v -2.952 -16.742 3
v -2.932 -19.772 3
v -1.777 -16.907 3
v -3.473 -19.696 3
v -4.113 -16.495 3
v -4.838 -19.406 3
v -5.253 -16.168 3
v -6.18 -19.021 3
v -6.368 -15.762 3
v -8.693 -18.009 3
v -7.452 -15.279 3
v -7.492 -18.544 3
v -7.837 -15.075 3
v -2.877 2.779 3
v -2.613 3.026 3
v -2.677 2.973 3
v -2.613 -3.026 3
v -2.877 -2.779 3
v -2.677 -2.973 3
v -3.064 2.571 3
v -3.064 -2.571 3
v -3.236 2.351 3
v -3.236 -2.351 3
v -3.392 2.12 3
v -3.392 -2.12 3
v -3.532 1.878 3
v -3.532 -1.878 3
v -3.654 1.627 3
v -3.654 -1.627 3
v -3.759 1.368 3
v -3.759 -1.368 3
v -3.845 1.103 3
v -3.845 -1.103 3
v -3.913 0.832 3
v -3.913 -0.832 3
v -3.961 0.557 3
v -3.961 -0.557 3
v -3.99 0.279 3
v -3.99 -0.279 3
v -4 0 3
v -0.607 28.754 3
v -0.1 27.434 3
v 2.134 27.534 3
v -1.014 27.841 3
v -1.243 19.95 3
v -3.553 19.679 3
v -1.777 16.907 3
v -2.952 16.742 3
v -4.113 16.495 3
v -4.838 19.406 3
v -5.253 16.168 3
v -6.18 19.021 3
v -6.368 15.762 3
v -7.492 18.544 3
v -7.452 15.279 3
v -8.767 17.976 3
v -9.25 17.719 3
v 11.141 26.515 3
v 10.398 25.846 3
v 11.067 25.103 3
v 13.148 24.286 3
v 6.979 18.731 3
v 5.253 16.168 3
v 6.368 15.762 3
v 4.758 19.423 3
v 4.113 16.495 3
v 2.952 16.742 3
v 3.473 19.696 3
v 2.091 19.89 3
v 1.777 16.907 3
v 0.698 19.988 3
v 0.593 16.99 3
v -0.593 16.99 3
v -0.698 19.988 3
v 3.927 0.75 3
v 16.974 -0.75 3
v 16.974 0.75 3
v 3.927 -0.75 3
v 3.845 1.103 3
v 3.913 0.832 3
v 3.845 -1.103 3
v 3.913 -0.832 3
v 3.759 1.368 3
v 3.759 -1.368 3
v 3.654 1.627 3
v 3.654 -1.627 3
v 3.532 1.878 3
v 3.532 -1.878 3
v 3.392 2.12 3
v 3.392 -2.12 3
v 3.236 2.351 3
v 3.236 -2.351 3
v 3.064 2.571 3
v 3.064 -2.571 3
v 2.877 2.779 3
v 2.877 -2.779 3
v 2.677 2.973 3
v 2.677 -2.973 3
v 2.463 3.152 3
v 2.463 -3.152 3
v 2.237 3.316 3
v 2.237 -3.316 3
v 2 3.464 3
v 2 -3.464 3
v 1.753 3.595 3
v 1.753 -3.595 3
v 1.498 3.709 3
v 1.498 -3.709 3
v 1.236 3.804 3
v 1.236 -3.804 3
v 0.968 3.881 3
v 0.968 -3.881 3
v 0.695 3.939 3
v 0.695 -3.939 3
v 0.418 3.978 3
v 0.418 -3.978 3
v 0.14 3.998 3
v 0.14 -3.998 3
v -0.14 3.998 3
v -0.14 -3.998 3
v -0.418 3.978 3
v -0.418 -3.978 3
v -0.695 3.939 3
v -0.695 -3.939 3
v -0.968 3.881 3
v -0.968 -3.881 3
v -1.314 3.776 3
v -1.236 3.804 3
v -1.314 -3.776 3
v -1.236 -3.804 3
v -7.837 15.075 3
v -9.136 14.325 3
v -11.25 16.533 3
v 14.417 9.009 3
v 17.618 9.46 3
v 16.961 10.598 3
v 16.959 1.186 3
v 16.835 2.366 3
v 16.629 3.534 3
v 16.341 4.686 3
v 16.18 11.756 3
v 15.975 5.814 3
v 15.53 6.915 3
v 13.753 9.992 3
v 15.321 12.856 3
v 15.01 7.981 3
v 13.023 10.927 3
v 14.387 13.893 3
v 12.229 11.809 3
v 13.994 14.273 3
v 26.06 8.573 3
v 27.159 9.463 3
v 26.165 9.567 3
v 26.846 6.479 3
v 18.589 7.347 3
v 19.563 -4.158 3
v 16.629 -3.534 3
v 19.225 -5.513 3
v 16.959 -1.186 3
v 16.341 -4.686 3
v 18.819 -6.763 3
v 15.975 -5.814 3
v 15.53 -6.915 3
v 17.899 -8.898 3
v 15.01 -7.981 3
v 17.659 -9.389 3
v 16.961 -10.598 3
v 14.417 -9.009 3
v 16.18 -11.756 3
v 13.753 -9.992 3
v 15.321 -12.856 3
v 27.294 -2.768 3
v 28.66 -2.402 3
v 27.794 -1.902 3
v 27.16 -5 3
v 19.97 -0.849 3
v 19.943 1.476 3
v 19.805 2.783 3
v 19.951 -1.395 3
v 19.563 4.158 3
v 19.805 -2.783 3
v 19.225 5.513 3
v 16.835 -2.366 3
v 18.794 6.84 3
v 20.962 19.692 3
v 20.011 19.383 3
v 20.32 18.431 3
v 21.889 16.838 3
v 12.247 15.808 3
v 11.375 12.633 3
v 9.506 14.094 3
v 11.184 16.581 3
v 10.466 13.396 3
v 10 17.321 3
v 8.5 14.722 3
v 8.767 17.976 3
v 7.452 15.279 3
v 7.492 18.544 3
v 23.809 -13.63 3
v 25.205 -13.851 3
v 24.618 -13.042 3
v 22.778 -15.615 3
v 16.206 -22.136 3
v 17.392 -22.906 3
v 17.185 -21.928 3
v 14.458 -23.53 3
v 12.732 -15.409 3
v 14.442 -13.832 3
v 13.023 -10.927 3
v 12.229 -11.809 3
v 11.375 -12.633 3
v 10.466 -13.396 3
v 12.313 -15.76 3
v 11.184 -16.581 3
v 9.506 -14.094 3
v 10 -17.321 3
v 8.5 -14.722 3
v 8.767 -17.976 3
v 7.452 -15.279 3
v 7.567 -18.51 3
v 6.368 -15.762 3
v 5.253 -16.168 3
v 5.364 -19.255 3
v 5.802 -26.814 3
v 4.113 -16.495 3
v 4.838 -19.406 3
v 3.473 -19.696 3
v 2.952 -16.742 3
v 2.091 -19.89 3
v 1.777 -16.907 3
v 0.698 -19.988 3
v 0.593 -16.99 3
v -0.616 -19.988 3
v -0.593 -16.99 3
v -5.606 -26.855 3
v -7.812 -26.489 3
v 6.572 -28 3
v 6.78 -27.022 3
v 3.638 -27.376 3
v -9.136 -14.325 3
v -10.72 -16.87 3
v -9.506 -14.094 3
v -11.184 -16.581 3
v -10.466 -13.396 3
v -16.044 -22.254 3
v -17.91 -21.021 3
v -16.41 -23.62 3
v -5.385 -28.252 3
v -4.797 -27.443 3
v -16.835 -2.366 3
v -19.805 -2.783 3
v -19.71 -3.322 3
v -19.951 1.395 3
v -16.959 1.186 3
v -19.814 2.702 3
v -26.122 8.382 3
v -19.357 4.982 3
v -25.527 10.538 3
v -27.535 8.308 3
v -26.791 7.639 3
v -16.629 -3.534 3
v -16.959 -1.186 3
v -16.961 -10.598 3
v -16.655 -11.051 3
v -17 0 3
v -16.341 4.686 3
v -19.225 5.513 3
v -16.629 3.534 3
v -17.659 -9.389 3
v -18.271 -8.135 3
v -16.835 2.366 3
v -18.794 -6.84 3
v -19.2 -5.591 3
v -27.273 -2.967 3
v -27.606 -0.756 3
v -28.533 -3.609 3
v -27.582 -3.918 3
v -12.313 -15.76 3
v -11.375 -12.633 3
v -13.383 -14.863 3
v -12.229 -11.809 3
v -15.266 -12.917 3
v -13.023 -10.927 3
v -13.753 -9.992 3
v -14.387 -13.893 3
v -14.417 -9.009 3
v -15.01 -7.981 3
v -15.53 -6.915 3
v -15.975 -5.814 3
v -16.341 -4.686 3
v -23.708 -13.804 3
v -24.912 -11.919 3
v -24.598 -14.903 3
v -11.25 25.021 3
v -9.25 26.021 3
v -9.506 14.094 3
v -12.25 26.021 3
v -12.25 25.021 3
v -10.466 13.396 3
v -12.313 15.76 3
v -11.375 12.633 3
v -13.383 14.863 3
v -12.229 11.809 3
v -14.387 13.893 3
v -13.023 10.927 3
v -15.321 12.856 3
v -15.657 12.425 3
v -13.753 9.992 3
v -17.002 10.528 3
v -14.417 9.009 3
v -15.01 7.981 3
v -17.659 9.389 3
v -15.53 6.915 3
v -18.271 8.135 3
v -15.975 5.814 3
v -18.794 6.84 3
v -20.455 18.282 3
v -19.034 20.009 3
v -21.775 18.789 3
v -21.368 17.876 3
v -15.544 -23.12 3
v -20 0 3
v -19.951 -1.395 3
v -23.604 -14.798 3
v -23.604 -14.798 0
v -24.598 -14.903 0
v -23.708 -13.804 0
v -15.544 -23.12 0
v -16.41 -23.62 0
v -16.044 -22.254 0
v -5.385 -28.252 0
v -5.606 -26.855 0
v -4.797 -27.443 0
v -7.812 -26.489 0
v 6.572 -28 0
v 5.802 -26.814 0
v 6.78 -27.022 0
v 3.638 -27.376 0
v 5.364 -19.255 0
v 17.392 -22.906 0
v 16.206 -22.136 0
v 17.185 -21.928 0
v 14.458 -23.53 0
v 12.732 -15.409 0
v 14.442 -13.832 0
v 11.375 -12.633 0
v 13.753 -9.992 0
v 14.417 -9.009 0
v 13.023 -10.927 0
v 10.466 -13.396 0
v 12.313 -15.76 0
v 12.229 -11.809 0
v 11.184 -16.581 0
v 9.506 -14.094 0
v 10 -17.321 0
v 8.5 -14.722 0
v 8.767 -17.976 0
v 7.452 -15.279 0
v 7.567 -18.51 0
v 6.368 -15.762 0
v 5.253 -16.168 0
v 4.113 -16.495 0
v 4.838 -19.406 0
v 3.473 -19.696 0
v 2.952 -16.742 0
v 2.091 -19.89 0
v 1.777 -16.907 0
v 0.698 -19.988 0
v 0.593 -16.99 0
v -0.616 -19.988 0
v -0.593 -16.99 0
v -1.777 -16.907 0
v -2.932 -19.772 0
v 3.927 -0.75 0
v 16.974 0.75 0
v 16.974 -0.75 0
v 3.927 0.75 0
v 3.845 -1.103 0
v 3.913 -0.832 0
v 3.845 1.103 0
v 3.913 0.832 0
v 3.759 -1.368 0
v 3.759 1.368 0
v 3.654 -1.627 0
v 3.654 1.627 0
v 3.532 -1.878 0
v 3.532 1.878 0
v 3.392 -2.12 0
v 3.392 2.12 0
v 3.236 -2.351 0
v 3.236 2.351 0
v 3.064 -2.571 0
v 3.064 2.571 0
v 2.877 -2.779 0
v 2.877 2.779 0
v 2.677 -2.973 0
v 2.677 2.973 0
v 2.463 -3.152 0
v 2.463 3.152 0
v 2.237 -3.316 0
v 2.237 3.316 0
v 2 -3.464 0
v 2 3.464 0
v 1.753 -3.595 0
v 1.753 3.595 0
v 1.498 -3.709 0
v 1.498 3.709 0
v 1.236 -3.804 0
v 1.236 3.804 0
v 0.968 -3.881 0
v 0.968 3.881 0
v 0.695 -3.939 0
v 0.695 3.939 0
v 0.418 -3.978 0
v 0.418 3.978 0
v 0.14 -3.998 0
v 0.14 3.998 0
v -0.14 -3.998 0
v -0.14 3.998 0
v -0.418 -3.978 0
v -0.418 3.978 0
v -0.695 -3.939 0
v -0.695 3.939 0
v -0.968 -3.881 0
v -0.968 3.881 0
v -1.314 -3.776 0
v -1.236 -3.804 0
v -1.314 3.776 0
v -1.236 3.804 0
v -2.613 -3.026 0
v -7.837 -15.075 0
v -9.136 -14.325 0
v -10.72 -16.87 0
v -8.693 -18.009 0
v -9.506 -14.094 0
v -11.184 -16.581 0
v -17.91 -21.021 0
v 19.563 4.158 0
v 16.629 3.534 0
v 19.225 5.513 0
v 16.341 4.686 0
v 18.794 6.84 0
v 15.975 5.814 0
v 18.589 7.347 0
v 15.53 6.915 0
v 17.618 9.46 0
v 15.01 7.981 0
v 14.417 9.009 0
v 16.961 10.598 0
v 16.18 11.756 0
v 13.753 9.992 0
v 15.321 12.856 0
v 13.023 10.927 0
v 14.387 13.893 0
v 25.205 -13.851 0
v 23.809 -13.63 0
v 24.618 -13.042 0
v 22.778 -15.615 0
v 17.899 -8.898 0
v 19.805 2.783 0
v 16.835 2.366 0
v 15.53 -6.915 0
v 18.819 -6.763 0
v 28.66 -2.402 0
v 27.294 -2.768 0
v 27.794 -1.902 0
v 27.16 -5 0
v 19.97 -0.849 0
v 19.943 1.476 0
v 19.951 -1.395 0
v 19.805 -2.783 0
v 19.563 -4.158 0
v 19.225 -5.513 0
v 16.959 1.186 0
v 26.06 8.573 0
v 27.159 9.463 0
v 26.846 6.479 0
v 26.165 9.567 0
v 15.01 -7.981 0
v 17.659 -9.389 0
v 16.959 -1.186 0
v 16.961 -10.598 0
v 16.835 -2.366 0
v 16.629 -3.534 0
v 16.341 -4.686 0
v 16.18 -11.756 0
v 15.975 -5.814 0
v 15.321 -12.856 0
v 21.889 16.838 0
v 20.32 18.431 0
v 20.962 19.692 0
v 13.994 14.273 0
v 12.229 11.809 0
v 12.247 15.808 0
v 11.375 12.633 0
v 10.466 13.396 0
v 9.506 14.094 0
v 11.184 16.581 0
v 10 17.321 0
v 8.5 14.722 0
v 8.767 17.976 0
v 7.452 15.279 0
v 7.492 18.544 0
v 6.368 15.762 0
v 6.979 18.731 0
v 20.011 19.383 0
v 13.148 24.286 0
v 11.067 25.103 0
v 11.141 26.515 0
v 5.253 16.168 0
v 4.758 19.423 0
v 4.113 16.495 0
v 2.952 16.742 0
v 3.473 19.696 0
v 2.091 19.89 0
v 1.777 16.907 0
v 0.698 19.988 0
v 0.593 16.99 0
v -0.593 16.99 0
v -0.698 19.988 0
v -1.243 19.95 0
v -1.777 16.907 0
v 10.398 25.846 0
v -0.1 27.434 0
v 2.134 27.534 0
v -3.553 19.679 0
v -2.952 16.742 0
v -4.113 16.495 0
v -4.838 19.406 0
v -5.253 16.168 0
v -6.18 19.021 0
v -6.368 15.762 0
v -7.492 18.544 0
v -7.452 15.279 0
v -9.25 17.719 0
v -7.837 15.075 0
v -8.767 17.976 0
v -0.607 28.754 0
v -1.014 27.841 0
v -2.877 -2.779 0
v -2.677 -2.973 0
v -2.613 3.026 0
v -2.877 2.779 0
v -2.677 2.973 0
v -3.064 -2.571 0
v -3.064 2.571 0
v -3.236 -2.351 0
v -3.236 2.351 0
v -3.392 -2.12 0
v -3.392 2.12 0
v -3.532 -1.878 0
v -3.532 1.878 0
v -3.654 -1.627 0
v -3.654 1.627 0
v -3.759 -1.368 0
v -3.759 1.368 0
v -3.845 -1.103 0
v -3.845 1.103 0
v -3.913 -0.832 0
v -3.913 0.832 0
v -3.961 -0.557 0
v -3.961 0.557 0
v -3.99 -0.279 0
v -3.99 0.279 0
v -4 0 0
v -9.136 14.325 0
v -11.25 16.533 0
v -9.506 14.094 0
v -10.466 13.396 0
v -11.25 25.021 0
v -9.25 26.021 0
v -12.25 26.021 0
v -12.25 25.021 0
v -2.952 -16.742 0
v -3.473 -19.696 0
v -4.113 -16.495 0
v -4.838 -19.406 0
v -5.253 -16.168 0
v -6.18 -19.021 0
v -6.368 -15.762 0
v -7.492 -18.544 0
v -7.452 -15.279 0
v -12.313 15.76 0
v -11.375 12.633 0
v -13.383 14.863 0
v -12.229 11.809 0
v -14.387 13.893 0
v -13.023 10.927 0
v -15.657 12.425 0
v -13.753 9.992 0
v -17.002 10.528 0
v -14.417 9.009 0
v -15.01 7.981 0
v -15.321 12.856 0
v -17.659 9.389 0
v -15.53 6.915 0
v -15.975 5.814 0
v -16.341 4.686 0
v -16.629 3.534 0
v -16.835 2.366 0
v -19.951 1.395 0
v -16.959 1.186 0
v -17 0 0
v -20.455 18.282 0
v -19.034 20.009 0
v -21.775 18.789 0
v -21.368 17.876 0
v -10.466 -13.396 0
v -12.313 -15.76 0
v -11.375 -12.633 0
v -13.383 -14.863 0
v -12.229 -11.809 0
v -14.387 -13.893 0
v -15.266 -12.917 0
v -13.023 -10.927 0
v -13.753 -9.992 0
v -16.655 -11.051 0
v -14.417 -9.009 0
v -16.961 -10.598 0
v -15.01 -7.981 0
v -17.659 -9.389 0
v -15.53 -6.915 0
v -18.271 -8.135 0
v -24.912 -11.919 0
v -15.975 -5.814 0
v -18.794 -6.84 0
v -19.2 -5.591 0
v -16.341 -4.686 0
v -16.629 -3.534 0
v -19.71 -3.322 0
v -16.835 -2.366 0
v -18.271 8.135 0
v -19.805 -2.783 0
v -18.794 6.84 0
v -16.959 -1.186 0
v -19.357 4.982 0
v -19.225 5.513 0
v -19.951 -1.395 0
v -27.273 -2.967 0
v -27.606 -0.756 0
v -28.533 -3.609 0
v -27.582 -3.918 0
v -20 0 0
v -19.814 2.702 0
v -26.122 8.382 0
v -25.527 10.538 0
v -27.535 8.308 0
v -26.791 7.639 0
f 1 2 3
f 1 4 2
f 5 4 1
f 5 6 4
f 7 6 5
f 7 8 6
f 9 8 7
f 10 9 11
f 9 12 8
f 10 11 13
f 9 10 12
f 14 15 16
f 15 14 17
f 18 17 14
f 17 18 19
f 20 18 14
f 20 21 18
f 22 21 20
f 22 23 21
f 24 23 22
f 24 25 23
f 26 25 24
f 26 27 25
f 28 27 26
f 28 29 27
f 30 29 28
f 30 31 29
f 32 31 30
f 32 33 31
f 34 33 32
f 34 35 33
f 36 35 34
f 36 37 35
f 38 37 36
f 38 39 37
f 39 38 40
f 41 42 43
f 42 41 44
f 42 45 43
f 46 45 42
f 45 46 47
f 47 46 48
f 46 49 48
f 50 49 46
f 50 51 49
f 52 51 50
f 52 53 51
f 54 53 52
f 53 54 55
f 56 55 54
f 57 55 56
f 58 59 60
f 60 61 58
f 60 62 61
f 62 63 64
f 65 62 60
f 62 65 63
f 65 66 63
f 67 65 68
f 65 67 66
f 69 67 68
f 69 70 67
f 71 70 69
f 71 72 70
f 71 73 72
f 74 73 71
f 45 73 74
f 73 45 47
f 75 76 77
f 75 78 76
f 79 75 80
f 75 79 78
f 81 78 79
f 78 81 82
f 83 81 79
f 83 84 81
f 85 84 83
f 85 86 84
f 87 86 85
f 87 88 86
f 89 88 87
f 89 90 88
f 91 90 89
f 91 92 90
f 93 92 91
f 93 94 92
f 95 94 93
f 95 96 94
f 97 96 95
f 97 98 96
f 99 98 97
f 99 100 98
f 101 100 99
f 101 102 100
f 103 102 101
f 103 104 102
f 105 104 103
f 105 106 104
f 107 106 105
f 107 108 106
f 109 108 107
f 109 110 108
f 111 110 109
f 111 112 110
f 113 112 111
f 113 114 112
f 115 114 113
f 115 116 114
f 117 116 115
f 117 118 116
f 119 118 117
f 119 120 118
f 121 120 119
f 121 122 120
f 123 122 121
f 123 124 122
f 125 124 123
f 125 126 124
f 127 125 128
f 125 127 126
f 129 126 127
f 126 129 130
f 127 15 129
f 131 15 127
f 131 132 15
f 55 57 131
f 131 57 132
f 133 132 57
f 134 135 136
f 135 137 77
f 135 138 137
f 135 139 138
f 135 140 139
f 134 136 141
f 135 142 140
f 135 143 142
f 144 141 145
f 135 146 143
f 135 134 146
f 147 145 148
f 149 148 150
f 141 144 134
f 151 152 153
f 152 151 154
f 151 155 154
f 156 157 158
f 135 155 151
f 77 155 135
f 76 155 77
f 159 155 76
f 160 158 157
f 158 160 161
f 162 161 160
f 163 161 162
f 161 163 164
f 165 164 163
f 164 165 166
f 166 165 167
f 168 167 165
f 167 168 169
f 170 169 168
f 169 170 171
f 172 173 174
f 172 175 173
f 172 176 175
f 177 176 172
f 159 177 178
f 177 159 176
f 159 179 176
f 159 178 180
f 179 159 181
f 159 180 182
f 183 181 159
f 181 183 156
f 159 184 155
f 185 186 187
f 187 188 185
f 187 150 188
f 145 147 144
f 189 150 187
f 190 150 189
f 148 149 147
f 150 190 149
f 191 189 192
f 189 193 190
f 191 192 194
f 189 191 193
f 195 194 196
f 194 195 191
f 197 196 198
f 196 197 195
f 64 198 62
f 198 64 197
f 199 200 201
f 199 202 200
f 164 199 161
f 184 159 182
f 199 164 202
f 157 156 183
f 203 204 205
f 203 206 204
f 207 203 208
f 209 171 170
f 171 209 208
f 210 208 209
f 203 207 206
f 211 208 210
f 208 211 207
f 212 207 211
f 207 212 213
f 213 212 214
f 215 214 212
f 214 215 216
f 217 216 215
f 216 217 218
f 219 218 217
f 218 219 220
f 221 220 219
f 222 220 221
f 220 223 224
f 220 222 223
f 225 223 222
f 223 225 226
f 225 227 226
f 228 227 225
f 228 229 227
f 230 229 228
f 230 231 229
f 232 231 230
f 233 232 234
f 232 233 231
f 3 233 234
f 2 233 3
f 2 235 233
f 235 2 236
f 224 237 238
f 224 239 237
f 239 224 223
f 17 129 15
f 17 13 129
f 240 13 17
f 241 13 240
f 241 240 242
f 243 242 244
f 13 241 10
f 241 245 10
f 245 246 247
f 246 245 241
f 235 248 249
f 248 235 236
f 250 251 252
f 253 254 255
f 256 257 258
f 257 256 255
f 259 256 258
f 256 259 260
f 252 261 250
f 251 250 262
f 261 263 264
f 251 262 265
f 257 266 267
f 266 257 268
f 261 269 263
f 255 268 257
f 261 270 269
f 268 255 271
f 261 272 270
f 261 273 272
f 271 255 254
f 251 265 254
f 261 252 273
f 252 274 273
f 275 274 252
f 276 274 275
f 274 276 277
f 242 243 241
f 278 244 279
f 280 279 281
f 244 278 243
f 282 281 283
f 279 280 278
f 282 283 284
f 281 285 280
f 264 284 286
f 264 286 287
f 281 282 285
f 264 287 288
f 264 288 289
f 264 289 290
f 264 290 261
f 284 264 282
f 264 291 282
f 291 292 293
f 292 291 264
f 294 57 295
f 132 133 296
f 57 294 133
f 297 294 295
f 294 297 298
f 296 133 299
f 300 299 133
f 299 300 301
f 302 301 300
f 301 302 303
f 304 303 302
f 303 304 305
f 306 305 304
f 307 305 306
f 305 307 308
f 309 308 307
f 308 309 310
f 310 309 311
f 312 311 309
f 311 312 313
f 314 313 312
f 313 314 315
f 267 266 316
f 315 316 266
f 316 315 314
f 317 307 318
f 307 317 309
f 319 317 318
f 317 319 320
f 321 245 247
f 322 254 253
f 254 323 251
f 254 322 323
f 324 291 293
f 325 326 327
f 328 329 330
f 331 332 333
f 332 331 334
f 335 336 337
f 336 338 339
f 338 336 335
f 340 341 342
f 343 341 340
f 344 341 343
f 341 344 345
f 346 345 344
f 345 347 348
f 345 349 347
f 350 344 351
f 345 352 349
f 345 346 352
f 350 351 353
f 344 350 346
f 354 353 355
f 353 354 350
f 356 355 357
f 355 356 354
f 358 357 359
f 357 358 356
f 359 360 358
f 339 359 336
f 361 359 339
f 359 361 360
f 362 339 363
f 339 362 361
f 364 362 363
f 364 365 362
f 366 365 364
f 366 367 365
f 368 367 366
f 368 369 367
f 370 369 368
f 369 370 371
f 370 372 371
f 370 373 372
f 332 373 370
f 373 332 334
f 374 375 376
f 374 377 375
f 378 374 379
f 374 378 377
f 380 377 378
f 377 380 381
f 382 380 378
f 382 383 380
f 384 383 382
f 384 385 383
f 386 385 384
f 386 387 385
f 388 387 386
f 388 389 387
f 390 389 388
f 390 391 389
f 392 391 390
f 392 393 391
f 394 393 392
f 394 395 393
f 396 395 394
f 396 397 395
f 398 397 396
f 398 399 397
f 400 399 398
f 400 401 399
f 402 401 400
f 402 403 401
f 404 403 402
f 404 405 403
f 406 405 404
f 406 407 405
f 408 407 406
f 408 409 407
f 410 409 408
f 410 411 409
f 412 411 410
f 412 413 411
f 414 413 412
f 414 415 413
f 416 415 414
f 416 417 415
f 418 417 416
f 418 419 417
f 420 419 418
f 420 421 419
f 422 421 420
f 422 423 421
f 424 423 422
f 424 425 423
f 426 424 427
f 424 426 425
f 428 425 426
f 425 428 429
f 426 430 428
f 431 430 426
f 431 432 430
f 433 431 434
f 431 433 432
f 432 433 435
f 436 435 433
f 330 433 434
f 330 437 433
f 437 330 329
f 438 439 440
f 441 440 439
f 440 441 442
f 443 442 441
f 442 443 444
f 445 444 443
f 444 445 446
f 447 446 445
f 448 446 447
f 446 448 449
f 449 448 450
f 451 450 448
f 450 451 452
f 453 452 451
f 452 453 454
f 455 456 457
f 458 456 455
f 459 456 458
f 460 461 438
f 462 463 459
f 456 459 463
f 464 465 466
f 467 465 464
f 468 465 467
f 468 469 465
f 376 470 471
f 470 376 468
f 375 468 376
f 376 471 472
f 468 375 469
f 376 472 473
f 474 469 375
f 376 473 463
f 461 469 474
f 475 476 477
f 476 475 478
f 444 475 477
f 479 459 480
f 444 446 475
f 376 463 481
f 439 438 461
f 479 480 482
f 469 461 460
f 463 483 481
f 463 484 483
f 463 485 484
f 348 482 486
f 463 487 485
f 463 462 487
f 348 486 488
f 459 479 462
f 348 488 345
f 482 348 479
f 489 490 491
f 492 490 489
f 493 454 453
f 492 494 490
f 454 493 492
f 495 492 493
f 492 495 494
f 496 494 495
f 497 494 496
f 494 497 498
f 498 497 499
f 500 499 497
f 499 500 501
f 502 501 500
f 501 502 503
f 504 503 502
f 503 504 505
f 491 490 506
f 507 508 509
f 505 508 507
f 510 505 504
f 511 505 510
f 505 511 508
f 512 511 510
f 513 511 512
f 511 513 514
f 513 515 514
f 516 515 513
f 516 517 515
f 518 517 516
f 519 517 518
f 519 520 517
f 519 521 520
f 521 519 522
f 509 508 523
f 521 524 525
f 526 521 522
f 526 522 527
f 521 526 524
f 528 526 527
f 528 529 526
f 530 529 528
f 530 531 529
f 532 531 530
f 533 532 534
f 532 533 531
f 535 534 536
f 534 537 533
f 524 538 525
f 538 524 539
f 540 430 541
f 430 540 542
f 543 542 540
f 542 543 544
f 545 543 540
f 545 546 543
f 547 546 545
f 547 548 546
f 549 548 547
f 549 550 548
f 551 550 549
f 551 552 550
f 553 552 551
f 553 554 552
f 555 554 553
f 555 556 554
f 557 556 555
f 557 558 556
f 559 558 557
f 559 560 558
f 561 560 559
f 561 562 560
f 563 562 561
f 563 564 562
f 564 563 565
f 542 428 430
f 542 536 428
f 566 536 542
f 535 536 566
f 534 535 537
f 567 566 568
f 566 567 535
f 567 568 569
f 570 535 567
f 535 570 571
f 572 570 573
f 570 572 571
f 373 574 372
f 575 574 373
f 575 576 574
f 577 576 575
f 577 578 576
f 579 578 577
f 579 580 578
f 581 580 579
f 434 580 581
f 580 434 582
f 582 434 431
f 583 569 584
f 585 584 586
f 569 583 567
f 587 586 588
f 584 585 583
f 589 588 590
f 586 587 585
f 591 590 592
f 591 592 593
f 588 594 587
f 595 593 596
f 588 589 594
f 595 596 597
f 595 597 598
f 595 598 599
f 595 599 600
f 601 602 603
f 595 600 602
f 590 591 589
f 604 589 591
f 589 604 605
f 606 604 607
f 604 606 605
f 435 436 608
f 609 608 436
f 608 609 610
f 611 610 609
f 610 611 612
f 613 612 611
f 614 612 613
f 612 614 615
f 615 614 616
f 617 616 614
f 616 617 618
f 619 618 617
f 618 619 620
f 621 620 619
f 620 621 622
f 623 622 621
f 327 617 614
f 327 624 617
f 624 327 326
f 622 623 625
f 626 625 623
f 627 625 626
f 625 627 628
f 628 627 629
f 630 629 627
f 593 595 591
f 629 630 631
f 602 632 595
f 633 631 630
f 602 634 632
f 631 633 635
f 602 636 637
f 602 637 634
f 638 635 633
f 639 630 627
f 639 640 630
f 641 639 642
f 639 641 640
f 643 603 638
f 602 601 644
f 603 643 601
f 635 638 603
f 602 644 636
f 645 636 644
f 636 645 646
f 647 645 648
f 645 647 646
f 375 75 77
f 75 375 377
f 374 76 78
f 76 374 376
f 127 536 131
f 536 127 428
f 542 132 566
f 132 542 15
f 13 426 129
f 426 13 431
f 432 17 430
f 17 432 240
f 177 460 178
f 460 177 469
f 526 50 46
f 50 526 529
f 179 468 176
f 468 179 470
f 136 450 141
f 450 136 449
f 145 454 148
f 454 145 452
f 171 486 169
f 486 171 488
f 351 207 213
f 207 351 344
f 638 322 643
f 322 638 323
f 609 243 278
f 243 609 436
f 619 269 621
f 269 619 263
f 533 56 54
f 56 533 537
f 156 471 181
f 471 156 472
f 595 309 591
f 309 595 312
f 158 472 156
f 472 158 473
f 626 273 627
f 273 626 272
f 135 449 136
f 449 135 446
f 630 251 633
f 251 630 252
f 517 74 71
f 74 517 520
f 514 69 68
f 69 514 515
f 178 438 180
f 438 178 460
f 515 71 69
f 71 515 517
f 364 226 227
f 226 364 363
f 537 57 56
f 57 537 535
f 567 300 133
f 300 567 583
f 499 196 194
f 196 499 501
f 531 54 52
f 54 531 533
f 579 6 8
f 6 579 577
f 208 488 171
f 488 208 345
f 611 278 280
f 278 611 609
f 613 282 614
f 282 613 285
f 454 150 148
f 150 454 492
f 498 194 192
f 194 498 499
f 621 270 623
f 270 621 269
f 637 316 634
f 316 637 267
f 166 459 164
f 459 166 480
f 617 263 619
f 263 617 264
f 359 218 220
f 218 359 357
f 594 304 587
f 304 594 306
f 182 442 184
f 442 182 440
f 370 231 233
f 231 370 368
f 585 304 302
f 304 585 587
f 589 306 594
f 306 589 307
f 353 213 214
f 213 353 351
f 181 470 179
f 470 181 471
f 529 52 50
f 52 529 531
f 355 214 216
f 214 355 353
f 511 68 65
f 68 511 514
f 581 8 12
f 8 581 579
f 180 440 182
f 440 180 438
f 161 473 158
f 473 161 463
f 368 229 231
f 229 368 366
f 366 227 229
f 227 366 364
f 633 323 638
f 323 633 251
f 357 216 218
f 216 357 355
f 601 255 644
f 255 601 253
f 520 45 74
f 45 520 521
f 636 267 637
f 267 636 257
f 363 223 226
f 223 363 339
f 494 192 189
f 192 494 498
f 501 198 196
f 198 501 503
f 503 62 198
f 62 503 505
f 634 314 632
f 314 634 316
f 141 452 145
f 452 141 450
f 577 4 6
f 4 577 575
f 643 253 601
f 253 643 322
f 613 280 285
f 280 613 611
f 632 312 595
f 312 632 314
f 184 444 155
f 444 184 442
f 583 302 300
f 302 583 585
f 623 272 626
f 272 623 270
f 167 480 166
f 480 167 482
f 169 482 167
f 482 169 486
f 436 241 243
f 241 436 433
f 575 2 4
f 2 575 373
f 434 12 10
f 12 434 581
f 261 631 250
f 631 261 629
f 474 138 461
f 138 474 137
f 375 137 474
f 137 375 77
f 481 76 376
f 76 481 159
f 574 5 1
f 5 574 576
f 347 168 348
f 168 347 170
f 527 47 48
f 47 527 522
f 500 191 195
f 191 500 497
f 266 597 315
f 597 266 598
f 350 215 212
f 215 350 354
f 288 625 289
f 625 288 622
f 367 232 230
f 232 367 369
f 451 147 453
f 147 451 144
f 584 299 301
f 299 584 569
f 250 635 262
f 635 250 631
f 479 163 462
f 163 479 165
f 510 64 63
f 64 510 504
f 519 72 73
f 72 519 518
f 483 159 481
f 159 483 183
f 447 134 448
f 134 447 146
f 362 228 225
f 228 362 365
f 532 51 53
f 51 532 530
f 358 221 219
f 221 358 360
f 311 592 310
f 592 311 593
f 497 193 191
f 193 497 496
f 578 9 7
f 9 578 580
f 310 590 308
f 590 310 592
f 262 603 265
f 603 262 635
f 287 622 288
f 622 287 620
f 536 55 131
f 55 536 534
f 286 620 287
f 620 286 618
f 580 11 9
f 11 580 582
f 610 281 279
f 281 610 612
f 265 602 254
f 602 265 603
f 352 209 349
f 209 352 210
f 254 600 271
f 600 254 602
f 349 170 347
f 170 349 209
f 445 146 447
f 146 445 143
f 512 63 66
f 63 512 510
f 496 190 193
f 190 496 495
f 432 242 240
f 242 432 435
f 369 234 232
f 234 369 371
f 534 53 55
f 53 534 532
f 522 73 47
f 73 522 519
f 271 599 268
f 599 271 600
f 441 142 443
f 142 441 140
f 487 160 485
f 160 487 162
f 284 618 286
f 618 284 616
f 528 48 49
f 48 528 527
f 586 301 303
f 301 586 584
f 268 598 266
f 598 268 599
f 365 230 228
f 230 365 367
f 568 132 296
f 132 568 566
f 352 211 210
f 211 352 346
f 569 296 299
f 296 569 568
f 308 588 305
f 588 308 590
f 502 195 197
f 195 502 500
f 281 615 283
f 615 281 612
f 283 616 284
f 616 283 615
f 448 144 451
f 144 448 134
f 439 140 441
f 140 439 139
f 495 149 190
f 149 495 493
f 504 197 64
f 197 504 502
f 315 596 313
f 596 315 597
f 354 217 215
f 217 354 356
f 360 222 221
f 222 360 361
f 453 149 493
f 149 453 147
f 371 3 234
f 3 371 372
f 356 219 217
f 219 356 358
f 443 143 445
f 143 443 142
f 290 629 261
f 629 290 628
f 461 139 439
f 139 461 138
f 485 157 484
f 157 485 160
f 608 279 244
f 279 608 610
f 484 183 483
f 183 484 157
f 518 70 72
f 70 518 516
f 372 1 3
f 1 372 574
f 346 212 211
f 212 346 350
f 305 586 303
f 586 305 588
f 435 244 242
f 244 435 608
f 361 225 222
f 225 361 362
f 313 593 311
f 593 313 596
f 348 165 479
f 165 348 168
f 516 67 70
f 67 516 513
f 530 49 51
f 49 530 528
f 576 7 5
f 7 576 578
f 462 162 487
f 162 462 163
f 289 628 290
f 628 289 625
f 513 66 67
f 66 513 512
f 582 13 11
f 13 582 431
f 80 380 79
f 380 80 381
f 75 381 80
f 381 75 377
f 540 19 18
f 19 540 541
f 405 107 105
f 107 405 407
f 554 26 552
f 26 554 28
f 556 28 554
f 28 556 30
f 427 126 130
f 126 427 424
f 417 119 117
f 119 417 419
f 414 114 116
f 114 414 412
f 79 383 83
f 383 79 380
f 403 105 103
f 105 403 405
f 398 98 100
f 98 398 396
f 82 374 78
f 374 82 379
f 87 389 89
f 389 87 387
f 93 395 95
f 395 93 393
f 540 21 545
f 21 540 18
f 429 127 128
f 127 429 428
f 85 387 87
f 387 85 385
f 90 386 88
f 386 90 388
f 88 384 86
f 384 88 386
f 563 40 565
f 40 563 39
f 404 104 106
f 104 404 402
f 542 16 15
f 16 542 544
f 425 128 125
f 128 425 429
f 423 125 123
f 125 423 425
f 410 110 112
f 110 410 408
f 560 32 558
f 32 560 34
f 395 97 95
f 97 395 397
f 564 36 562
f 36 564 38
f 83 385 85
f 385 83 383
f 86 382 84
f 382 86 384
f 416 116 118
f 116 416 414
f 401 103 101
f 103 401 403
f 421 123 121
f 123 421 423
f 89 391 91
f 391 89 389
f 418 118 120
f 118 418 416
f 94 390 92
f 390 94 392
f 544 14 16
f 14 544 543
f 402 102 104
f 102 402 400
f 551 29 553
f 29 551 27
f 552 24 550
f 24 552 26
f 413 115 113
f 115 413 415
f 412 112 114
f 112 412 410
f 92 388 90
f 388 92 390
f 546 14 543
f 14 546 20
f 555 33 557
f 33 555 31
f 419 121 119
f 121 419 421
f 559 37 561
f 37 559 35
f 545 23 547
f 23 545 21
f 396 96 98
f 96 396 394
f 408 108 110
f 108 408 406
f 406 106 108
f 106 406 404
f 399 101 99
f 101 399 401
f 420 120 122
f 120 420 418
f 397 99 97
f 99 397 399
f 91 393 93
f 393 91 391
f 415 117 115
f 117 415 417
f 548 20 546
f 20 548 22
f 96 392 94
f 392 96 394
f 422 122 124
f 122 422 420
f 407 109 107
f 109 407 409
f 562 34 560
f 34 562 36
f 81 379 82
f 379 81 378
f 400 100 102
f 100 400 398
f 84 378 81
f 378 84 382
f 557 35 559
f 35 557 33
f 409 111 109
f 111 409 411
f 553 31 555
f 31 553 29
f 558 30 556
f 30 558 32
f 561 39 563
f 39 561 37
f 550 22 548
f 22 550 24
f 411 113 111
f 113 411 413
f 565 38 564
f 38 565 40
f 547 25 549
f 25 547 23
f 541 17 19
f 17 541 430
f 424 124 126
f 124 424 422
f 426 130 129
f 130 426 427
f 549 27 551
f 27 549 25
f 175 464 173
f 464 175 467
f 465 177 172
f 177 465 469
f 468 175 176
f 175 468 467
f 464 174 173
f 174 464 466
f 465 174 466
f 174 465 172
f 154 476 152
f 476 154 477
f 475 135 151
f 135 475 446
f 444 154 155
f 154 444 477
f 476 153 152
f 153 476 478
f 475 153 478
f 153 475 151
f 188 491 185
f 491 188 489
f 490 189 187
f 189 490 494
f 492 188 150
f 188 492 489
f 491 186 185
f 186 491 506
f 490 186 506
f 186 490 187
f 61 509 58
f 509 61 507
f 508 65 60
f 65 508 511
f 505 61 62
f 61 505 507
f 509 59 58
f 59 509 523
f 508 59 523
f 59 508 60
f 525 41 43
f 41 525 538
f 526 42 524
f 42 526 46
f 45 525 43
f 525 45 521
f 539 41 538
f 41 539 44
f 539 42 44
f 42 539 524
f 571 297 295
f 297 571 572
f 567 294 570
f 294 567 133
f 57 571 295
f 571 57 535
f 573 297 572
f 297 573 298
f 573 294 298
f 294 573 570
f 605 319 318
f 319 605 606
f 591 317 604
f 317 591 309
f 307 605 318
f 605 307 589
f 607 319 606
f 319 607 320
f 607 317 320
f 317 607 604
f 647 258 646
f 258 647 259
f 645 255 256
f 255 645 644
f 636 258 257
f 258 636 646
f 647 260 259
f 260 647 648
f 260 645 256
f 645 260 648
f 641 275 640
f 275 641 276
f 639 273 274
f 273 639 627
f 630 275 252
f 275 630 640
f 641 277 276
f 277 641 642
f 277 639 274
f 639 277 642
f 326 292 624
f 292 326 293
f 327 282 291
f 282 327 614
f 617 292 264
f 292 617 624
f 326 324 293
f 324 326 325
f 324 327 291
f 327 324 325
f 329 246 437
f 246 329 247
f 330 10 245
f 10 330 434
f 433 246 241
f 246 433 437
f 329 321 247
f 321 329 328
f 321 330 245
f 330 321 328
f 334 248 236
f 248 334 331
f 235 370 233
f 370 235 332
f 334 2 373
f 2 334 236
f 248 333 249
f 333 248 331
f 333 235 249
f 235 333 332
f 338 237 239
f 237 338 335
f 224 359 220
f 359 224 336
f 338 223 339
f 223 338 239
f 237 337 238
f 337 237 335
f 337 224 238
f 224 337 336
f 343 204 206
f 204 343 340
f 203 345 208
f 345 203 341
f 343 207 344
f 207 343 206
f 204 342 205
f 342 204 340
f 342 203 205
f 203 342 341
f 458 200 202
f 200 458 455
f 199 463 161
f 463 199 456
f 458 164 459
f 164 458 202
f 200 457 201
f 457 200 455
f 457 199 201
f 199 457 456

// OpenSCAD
/*
Clock Lever Escapement
by Dave Ballard
Sep 29, 2022

*/                                                                     

//as a rule, apply clearances to holes, not shafts
clearance_press = 0.1;
clearance_firm = 0.2;
clearance_loose = 0.4;
        
escWheel(15,20);                                                                                           
module keyShaft(h, r, cut = 0.25, cut_end = 0) {
    cut_z = cut_end < 0.01 ? 0 : 1.5*h+cut_end;
        
    difference() {
        cylinder(h,r,r,$fn=90);
        translate([2*r*(1-cut),0,cut_z])
            cube([r*2,r*2,h*3], center=true);
    }
}

module balanceWheel(ring_r, height = 3,  spokes = 3, spokewidth = 1.5, hub_r = 4, ring_w = 1){
    
    union() {
        cylinder(height, hub_r, hub_r, $fn=90);
        for(i=[0:spokes-1])
            rotate([0,0,i*360/spokes])
                translate([hub_r/2,-spokewidth/2,0])
                    cube([ring_r-ring_w/2-hub_r/2, spokewidth, height],  center=false);
        difference() {
                cylinder(height, ring_r, ring_r, $fn=90);
                cylinder(height*3,ring_r-ring_w,ring_r-ring_w, center=true, $fn=90);
        }
    }
}

module hairSpring(spacing, height, thickness, loops)
    linear_extrude(height=height) polygon(points= concat(
        [for(t = [90:360*loops]) 
            [(-thickness+spacing*t/90)*sin(t),(-thickness+spacing*t/90)*cos(t)]],
        [for(t = [360*loops:-1:90]) 
            [(spacing*t/90)*sin(t),(spacing*t/90)*cos(t)]]
            ));
        

module escWheel(teeth, ring_r, height = 3,  spokes = 3, spokewidth = 1.5, hub_r = 4, ring_w = 3){
    union() {
        balanceWheel(ring_r, height, spokes, spokewidth, hub_r, ring_w);
        for(i=[0:teeth-1])
            rotate([0,0,360*i/teeth])
            translate([ring_r-ring_w/2,0,0]) rotate([0,0,-30])  
                union() { 
                    cube([10,2,height]);
                    translate([10,0,0]) rotate([0,0,90]) cube([3,1,3]);
                }
    }
}

*translate([0,0,-2])
    union() {
        hairSpring(1.5, 1.5, 1, 5);
        difference() {
            keyShaft(5,2, cut_end=2);
            translate([0,0,-1]) cylinder(7,0.3,0.3);
        }
        translate([0,30-1,0]) cube([6,12,1.5]);
    }
    
//animation
*rotate([0,0,sin(360*$t)*90])
    union(){
        difference() {
            balanceWheel(30, 3, 3, 1.5, 4, 5);
            translate([0,0,-1])
                keyShaft(5,2+clearance_firm);
        }
        translate([8,0,3])
            cylinder(3,1,1, $fn=90);
    }
